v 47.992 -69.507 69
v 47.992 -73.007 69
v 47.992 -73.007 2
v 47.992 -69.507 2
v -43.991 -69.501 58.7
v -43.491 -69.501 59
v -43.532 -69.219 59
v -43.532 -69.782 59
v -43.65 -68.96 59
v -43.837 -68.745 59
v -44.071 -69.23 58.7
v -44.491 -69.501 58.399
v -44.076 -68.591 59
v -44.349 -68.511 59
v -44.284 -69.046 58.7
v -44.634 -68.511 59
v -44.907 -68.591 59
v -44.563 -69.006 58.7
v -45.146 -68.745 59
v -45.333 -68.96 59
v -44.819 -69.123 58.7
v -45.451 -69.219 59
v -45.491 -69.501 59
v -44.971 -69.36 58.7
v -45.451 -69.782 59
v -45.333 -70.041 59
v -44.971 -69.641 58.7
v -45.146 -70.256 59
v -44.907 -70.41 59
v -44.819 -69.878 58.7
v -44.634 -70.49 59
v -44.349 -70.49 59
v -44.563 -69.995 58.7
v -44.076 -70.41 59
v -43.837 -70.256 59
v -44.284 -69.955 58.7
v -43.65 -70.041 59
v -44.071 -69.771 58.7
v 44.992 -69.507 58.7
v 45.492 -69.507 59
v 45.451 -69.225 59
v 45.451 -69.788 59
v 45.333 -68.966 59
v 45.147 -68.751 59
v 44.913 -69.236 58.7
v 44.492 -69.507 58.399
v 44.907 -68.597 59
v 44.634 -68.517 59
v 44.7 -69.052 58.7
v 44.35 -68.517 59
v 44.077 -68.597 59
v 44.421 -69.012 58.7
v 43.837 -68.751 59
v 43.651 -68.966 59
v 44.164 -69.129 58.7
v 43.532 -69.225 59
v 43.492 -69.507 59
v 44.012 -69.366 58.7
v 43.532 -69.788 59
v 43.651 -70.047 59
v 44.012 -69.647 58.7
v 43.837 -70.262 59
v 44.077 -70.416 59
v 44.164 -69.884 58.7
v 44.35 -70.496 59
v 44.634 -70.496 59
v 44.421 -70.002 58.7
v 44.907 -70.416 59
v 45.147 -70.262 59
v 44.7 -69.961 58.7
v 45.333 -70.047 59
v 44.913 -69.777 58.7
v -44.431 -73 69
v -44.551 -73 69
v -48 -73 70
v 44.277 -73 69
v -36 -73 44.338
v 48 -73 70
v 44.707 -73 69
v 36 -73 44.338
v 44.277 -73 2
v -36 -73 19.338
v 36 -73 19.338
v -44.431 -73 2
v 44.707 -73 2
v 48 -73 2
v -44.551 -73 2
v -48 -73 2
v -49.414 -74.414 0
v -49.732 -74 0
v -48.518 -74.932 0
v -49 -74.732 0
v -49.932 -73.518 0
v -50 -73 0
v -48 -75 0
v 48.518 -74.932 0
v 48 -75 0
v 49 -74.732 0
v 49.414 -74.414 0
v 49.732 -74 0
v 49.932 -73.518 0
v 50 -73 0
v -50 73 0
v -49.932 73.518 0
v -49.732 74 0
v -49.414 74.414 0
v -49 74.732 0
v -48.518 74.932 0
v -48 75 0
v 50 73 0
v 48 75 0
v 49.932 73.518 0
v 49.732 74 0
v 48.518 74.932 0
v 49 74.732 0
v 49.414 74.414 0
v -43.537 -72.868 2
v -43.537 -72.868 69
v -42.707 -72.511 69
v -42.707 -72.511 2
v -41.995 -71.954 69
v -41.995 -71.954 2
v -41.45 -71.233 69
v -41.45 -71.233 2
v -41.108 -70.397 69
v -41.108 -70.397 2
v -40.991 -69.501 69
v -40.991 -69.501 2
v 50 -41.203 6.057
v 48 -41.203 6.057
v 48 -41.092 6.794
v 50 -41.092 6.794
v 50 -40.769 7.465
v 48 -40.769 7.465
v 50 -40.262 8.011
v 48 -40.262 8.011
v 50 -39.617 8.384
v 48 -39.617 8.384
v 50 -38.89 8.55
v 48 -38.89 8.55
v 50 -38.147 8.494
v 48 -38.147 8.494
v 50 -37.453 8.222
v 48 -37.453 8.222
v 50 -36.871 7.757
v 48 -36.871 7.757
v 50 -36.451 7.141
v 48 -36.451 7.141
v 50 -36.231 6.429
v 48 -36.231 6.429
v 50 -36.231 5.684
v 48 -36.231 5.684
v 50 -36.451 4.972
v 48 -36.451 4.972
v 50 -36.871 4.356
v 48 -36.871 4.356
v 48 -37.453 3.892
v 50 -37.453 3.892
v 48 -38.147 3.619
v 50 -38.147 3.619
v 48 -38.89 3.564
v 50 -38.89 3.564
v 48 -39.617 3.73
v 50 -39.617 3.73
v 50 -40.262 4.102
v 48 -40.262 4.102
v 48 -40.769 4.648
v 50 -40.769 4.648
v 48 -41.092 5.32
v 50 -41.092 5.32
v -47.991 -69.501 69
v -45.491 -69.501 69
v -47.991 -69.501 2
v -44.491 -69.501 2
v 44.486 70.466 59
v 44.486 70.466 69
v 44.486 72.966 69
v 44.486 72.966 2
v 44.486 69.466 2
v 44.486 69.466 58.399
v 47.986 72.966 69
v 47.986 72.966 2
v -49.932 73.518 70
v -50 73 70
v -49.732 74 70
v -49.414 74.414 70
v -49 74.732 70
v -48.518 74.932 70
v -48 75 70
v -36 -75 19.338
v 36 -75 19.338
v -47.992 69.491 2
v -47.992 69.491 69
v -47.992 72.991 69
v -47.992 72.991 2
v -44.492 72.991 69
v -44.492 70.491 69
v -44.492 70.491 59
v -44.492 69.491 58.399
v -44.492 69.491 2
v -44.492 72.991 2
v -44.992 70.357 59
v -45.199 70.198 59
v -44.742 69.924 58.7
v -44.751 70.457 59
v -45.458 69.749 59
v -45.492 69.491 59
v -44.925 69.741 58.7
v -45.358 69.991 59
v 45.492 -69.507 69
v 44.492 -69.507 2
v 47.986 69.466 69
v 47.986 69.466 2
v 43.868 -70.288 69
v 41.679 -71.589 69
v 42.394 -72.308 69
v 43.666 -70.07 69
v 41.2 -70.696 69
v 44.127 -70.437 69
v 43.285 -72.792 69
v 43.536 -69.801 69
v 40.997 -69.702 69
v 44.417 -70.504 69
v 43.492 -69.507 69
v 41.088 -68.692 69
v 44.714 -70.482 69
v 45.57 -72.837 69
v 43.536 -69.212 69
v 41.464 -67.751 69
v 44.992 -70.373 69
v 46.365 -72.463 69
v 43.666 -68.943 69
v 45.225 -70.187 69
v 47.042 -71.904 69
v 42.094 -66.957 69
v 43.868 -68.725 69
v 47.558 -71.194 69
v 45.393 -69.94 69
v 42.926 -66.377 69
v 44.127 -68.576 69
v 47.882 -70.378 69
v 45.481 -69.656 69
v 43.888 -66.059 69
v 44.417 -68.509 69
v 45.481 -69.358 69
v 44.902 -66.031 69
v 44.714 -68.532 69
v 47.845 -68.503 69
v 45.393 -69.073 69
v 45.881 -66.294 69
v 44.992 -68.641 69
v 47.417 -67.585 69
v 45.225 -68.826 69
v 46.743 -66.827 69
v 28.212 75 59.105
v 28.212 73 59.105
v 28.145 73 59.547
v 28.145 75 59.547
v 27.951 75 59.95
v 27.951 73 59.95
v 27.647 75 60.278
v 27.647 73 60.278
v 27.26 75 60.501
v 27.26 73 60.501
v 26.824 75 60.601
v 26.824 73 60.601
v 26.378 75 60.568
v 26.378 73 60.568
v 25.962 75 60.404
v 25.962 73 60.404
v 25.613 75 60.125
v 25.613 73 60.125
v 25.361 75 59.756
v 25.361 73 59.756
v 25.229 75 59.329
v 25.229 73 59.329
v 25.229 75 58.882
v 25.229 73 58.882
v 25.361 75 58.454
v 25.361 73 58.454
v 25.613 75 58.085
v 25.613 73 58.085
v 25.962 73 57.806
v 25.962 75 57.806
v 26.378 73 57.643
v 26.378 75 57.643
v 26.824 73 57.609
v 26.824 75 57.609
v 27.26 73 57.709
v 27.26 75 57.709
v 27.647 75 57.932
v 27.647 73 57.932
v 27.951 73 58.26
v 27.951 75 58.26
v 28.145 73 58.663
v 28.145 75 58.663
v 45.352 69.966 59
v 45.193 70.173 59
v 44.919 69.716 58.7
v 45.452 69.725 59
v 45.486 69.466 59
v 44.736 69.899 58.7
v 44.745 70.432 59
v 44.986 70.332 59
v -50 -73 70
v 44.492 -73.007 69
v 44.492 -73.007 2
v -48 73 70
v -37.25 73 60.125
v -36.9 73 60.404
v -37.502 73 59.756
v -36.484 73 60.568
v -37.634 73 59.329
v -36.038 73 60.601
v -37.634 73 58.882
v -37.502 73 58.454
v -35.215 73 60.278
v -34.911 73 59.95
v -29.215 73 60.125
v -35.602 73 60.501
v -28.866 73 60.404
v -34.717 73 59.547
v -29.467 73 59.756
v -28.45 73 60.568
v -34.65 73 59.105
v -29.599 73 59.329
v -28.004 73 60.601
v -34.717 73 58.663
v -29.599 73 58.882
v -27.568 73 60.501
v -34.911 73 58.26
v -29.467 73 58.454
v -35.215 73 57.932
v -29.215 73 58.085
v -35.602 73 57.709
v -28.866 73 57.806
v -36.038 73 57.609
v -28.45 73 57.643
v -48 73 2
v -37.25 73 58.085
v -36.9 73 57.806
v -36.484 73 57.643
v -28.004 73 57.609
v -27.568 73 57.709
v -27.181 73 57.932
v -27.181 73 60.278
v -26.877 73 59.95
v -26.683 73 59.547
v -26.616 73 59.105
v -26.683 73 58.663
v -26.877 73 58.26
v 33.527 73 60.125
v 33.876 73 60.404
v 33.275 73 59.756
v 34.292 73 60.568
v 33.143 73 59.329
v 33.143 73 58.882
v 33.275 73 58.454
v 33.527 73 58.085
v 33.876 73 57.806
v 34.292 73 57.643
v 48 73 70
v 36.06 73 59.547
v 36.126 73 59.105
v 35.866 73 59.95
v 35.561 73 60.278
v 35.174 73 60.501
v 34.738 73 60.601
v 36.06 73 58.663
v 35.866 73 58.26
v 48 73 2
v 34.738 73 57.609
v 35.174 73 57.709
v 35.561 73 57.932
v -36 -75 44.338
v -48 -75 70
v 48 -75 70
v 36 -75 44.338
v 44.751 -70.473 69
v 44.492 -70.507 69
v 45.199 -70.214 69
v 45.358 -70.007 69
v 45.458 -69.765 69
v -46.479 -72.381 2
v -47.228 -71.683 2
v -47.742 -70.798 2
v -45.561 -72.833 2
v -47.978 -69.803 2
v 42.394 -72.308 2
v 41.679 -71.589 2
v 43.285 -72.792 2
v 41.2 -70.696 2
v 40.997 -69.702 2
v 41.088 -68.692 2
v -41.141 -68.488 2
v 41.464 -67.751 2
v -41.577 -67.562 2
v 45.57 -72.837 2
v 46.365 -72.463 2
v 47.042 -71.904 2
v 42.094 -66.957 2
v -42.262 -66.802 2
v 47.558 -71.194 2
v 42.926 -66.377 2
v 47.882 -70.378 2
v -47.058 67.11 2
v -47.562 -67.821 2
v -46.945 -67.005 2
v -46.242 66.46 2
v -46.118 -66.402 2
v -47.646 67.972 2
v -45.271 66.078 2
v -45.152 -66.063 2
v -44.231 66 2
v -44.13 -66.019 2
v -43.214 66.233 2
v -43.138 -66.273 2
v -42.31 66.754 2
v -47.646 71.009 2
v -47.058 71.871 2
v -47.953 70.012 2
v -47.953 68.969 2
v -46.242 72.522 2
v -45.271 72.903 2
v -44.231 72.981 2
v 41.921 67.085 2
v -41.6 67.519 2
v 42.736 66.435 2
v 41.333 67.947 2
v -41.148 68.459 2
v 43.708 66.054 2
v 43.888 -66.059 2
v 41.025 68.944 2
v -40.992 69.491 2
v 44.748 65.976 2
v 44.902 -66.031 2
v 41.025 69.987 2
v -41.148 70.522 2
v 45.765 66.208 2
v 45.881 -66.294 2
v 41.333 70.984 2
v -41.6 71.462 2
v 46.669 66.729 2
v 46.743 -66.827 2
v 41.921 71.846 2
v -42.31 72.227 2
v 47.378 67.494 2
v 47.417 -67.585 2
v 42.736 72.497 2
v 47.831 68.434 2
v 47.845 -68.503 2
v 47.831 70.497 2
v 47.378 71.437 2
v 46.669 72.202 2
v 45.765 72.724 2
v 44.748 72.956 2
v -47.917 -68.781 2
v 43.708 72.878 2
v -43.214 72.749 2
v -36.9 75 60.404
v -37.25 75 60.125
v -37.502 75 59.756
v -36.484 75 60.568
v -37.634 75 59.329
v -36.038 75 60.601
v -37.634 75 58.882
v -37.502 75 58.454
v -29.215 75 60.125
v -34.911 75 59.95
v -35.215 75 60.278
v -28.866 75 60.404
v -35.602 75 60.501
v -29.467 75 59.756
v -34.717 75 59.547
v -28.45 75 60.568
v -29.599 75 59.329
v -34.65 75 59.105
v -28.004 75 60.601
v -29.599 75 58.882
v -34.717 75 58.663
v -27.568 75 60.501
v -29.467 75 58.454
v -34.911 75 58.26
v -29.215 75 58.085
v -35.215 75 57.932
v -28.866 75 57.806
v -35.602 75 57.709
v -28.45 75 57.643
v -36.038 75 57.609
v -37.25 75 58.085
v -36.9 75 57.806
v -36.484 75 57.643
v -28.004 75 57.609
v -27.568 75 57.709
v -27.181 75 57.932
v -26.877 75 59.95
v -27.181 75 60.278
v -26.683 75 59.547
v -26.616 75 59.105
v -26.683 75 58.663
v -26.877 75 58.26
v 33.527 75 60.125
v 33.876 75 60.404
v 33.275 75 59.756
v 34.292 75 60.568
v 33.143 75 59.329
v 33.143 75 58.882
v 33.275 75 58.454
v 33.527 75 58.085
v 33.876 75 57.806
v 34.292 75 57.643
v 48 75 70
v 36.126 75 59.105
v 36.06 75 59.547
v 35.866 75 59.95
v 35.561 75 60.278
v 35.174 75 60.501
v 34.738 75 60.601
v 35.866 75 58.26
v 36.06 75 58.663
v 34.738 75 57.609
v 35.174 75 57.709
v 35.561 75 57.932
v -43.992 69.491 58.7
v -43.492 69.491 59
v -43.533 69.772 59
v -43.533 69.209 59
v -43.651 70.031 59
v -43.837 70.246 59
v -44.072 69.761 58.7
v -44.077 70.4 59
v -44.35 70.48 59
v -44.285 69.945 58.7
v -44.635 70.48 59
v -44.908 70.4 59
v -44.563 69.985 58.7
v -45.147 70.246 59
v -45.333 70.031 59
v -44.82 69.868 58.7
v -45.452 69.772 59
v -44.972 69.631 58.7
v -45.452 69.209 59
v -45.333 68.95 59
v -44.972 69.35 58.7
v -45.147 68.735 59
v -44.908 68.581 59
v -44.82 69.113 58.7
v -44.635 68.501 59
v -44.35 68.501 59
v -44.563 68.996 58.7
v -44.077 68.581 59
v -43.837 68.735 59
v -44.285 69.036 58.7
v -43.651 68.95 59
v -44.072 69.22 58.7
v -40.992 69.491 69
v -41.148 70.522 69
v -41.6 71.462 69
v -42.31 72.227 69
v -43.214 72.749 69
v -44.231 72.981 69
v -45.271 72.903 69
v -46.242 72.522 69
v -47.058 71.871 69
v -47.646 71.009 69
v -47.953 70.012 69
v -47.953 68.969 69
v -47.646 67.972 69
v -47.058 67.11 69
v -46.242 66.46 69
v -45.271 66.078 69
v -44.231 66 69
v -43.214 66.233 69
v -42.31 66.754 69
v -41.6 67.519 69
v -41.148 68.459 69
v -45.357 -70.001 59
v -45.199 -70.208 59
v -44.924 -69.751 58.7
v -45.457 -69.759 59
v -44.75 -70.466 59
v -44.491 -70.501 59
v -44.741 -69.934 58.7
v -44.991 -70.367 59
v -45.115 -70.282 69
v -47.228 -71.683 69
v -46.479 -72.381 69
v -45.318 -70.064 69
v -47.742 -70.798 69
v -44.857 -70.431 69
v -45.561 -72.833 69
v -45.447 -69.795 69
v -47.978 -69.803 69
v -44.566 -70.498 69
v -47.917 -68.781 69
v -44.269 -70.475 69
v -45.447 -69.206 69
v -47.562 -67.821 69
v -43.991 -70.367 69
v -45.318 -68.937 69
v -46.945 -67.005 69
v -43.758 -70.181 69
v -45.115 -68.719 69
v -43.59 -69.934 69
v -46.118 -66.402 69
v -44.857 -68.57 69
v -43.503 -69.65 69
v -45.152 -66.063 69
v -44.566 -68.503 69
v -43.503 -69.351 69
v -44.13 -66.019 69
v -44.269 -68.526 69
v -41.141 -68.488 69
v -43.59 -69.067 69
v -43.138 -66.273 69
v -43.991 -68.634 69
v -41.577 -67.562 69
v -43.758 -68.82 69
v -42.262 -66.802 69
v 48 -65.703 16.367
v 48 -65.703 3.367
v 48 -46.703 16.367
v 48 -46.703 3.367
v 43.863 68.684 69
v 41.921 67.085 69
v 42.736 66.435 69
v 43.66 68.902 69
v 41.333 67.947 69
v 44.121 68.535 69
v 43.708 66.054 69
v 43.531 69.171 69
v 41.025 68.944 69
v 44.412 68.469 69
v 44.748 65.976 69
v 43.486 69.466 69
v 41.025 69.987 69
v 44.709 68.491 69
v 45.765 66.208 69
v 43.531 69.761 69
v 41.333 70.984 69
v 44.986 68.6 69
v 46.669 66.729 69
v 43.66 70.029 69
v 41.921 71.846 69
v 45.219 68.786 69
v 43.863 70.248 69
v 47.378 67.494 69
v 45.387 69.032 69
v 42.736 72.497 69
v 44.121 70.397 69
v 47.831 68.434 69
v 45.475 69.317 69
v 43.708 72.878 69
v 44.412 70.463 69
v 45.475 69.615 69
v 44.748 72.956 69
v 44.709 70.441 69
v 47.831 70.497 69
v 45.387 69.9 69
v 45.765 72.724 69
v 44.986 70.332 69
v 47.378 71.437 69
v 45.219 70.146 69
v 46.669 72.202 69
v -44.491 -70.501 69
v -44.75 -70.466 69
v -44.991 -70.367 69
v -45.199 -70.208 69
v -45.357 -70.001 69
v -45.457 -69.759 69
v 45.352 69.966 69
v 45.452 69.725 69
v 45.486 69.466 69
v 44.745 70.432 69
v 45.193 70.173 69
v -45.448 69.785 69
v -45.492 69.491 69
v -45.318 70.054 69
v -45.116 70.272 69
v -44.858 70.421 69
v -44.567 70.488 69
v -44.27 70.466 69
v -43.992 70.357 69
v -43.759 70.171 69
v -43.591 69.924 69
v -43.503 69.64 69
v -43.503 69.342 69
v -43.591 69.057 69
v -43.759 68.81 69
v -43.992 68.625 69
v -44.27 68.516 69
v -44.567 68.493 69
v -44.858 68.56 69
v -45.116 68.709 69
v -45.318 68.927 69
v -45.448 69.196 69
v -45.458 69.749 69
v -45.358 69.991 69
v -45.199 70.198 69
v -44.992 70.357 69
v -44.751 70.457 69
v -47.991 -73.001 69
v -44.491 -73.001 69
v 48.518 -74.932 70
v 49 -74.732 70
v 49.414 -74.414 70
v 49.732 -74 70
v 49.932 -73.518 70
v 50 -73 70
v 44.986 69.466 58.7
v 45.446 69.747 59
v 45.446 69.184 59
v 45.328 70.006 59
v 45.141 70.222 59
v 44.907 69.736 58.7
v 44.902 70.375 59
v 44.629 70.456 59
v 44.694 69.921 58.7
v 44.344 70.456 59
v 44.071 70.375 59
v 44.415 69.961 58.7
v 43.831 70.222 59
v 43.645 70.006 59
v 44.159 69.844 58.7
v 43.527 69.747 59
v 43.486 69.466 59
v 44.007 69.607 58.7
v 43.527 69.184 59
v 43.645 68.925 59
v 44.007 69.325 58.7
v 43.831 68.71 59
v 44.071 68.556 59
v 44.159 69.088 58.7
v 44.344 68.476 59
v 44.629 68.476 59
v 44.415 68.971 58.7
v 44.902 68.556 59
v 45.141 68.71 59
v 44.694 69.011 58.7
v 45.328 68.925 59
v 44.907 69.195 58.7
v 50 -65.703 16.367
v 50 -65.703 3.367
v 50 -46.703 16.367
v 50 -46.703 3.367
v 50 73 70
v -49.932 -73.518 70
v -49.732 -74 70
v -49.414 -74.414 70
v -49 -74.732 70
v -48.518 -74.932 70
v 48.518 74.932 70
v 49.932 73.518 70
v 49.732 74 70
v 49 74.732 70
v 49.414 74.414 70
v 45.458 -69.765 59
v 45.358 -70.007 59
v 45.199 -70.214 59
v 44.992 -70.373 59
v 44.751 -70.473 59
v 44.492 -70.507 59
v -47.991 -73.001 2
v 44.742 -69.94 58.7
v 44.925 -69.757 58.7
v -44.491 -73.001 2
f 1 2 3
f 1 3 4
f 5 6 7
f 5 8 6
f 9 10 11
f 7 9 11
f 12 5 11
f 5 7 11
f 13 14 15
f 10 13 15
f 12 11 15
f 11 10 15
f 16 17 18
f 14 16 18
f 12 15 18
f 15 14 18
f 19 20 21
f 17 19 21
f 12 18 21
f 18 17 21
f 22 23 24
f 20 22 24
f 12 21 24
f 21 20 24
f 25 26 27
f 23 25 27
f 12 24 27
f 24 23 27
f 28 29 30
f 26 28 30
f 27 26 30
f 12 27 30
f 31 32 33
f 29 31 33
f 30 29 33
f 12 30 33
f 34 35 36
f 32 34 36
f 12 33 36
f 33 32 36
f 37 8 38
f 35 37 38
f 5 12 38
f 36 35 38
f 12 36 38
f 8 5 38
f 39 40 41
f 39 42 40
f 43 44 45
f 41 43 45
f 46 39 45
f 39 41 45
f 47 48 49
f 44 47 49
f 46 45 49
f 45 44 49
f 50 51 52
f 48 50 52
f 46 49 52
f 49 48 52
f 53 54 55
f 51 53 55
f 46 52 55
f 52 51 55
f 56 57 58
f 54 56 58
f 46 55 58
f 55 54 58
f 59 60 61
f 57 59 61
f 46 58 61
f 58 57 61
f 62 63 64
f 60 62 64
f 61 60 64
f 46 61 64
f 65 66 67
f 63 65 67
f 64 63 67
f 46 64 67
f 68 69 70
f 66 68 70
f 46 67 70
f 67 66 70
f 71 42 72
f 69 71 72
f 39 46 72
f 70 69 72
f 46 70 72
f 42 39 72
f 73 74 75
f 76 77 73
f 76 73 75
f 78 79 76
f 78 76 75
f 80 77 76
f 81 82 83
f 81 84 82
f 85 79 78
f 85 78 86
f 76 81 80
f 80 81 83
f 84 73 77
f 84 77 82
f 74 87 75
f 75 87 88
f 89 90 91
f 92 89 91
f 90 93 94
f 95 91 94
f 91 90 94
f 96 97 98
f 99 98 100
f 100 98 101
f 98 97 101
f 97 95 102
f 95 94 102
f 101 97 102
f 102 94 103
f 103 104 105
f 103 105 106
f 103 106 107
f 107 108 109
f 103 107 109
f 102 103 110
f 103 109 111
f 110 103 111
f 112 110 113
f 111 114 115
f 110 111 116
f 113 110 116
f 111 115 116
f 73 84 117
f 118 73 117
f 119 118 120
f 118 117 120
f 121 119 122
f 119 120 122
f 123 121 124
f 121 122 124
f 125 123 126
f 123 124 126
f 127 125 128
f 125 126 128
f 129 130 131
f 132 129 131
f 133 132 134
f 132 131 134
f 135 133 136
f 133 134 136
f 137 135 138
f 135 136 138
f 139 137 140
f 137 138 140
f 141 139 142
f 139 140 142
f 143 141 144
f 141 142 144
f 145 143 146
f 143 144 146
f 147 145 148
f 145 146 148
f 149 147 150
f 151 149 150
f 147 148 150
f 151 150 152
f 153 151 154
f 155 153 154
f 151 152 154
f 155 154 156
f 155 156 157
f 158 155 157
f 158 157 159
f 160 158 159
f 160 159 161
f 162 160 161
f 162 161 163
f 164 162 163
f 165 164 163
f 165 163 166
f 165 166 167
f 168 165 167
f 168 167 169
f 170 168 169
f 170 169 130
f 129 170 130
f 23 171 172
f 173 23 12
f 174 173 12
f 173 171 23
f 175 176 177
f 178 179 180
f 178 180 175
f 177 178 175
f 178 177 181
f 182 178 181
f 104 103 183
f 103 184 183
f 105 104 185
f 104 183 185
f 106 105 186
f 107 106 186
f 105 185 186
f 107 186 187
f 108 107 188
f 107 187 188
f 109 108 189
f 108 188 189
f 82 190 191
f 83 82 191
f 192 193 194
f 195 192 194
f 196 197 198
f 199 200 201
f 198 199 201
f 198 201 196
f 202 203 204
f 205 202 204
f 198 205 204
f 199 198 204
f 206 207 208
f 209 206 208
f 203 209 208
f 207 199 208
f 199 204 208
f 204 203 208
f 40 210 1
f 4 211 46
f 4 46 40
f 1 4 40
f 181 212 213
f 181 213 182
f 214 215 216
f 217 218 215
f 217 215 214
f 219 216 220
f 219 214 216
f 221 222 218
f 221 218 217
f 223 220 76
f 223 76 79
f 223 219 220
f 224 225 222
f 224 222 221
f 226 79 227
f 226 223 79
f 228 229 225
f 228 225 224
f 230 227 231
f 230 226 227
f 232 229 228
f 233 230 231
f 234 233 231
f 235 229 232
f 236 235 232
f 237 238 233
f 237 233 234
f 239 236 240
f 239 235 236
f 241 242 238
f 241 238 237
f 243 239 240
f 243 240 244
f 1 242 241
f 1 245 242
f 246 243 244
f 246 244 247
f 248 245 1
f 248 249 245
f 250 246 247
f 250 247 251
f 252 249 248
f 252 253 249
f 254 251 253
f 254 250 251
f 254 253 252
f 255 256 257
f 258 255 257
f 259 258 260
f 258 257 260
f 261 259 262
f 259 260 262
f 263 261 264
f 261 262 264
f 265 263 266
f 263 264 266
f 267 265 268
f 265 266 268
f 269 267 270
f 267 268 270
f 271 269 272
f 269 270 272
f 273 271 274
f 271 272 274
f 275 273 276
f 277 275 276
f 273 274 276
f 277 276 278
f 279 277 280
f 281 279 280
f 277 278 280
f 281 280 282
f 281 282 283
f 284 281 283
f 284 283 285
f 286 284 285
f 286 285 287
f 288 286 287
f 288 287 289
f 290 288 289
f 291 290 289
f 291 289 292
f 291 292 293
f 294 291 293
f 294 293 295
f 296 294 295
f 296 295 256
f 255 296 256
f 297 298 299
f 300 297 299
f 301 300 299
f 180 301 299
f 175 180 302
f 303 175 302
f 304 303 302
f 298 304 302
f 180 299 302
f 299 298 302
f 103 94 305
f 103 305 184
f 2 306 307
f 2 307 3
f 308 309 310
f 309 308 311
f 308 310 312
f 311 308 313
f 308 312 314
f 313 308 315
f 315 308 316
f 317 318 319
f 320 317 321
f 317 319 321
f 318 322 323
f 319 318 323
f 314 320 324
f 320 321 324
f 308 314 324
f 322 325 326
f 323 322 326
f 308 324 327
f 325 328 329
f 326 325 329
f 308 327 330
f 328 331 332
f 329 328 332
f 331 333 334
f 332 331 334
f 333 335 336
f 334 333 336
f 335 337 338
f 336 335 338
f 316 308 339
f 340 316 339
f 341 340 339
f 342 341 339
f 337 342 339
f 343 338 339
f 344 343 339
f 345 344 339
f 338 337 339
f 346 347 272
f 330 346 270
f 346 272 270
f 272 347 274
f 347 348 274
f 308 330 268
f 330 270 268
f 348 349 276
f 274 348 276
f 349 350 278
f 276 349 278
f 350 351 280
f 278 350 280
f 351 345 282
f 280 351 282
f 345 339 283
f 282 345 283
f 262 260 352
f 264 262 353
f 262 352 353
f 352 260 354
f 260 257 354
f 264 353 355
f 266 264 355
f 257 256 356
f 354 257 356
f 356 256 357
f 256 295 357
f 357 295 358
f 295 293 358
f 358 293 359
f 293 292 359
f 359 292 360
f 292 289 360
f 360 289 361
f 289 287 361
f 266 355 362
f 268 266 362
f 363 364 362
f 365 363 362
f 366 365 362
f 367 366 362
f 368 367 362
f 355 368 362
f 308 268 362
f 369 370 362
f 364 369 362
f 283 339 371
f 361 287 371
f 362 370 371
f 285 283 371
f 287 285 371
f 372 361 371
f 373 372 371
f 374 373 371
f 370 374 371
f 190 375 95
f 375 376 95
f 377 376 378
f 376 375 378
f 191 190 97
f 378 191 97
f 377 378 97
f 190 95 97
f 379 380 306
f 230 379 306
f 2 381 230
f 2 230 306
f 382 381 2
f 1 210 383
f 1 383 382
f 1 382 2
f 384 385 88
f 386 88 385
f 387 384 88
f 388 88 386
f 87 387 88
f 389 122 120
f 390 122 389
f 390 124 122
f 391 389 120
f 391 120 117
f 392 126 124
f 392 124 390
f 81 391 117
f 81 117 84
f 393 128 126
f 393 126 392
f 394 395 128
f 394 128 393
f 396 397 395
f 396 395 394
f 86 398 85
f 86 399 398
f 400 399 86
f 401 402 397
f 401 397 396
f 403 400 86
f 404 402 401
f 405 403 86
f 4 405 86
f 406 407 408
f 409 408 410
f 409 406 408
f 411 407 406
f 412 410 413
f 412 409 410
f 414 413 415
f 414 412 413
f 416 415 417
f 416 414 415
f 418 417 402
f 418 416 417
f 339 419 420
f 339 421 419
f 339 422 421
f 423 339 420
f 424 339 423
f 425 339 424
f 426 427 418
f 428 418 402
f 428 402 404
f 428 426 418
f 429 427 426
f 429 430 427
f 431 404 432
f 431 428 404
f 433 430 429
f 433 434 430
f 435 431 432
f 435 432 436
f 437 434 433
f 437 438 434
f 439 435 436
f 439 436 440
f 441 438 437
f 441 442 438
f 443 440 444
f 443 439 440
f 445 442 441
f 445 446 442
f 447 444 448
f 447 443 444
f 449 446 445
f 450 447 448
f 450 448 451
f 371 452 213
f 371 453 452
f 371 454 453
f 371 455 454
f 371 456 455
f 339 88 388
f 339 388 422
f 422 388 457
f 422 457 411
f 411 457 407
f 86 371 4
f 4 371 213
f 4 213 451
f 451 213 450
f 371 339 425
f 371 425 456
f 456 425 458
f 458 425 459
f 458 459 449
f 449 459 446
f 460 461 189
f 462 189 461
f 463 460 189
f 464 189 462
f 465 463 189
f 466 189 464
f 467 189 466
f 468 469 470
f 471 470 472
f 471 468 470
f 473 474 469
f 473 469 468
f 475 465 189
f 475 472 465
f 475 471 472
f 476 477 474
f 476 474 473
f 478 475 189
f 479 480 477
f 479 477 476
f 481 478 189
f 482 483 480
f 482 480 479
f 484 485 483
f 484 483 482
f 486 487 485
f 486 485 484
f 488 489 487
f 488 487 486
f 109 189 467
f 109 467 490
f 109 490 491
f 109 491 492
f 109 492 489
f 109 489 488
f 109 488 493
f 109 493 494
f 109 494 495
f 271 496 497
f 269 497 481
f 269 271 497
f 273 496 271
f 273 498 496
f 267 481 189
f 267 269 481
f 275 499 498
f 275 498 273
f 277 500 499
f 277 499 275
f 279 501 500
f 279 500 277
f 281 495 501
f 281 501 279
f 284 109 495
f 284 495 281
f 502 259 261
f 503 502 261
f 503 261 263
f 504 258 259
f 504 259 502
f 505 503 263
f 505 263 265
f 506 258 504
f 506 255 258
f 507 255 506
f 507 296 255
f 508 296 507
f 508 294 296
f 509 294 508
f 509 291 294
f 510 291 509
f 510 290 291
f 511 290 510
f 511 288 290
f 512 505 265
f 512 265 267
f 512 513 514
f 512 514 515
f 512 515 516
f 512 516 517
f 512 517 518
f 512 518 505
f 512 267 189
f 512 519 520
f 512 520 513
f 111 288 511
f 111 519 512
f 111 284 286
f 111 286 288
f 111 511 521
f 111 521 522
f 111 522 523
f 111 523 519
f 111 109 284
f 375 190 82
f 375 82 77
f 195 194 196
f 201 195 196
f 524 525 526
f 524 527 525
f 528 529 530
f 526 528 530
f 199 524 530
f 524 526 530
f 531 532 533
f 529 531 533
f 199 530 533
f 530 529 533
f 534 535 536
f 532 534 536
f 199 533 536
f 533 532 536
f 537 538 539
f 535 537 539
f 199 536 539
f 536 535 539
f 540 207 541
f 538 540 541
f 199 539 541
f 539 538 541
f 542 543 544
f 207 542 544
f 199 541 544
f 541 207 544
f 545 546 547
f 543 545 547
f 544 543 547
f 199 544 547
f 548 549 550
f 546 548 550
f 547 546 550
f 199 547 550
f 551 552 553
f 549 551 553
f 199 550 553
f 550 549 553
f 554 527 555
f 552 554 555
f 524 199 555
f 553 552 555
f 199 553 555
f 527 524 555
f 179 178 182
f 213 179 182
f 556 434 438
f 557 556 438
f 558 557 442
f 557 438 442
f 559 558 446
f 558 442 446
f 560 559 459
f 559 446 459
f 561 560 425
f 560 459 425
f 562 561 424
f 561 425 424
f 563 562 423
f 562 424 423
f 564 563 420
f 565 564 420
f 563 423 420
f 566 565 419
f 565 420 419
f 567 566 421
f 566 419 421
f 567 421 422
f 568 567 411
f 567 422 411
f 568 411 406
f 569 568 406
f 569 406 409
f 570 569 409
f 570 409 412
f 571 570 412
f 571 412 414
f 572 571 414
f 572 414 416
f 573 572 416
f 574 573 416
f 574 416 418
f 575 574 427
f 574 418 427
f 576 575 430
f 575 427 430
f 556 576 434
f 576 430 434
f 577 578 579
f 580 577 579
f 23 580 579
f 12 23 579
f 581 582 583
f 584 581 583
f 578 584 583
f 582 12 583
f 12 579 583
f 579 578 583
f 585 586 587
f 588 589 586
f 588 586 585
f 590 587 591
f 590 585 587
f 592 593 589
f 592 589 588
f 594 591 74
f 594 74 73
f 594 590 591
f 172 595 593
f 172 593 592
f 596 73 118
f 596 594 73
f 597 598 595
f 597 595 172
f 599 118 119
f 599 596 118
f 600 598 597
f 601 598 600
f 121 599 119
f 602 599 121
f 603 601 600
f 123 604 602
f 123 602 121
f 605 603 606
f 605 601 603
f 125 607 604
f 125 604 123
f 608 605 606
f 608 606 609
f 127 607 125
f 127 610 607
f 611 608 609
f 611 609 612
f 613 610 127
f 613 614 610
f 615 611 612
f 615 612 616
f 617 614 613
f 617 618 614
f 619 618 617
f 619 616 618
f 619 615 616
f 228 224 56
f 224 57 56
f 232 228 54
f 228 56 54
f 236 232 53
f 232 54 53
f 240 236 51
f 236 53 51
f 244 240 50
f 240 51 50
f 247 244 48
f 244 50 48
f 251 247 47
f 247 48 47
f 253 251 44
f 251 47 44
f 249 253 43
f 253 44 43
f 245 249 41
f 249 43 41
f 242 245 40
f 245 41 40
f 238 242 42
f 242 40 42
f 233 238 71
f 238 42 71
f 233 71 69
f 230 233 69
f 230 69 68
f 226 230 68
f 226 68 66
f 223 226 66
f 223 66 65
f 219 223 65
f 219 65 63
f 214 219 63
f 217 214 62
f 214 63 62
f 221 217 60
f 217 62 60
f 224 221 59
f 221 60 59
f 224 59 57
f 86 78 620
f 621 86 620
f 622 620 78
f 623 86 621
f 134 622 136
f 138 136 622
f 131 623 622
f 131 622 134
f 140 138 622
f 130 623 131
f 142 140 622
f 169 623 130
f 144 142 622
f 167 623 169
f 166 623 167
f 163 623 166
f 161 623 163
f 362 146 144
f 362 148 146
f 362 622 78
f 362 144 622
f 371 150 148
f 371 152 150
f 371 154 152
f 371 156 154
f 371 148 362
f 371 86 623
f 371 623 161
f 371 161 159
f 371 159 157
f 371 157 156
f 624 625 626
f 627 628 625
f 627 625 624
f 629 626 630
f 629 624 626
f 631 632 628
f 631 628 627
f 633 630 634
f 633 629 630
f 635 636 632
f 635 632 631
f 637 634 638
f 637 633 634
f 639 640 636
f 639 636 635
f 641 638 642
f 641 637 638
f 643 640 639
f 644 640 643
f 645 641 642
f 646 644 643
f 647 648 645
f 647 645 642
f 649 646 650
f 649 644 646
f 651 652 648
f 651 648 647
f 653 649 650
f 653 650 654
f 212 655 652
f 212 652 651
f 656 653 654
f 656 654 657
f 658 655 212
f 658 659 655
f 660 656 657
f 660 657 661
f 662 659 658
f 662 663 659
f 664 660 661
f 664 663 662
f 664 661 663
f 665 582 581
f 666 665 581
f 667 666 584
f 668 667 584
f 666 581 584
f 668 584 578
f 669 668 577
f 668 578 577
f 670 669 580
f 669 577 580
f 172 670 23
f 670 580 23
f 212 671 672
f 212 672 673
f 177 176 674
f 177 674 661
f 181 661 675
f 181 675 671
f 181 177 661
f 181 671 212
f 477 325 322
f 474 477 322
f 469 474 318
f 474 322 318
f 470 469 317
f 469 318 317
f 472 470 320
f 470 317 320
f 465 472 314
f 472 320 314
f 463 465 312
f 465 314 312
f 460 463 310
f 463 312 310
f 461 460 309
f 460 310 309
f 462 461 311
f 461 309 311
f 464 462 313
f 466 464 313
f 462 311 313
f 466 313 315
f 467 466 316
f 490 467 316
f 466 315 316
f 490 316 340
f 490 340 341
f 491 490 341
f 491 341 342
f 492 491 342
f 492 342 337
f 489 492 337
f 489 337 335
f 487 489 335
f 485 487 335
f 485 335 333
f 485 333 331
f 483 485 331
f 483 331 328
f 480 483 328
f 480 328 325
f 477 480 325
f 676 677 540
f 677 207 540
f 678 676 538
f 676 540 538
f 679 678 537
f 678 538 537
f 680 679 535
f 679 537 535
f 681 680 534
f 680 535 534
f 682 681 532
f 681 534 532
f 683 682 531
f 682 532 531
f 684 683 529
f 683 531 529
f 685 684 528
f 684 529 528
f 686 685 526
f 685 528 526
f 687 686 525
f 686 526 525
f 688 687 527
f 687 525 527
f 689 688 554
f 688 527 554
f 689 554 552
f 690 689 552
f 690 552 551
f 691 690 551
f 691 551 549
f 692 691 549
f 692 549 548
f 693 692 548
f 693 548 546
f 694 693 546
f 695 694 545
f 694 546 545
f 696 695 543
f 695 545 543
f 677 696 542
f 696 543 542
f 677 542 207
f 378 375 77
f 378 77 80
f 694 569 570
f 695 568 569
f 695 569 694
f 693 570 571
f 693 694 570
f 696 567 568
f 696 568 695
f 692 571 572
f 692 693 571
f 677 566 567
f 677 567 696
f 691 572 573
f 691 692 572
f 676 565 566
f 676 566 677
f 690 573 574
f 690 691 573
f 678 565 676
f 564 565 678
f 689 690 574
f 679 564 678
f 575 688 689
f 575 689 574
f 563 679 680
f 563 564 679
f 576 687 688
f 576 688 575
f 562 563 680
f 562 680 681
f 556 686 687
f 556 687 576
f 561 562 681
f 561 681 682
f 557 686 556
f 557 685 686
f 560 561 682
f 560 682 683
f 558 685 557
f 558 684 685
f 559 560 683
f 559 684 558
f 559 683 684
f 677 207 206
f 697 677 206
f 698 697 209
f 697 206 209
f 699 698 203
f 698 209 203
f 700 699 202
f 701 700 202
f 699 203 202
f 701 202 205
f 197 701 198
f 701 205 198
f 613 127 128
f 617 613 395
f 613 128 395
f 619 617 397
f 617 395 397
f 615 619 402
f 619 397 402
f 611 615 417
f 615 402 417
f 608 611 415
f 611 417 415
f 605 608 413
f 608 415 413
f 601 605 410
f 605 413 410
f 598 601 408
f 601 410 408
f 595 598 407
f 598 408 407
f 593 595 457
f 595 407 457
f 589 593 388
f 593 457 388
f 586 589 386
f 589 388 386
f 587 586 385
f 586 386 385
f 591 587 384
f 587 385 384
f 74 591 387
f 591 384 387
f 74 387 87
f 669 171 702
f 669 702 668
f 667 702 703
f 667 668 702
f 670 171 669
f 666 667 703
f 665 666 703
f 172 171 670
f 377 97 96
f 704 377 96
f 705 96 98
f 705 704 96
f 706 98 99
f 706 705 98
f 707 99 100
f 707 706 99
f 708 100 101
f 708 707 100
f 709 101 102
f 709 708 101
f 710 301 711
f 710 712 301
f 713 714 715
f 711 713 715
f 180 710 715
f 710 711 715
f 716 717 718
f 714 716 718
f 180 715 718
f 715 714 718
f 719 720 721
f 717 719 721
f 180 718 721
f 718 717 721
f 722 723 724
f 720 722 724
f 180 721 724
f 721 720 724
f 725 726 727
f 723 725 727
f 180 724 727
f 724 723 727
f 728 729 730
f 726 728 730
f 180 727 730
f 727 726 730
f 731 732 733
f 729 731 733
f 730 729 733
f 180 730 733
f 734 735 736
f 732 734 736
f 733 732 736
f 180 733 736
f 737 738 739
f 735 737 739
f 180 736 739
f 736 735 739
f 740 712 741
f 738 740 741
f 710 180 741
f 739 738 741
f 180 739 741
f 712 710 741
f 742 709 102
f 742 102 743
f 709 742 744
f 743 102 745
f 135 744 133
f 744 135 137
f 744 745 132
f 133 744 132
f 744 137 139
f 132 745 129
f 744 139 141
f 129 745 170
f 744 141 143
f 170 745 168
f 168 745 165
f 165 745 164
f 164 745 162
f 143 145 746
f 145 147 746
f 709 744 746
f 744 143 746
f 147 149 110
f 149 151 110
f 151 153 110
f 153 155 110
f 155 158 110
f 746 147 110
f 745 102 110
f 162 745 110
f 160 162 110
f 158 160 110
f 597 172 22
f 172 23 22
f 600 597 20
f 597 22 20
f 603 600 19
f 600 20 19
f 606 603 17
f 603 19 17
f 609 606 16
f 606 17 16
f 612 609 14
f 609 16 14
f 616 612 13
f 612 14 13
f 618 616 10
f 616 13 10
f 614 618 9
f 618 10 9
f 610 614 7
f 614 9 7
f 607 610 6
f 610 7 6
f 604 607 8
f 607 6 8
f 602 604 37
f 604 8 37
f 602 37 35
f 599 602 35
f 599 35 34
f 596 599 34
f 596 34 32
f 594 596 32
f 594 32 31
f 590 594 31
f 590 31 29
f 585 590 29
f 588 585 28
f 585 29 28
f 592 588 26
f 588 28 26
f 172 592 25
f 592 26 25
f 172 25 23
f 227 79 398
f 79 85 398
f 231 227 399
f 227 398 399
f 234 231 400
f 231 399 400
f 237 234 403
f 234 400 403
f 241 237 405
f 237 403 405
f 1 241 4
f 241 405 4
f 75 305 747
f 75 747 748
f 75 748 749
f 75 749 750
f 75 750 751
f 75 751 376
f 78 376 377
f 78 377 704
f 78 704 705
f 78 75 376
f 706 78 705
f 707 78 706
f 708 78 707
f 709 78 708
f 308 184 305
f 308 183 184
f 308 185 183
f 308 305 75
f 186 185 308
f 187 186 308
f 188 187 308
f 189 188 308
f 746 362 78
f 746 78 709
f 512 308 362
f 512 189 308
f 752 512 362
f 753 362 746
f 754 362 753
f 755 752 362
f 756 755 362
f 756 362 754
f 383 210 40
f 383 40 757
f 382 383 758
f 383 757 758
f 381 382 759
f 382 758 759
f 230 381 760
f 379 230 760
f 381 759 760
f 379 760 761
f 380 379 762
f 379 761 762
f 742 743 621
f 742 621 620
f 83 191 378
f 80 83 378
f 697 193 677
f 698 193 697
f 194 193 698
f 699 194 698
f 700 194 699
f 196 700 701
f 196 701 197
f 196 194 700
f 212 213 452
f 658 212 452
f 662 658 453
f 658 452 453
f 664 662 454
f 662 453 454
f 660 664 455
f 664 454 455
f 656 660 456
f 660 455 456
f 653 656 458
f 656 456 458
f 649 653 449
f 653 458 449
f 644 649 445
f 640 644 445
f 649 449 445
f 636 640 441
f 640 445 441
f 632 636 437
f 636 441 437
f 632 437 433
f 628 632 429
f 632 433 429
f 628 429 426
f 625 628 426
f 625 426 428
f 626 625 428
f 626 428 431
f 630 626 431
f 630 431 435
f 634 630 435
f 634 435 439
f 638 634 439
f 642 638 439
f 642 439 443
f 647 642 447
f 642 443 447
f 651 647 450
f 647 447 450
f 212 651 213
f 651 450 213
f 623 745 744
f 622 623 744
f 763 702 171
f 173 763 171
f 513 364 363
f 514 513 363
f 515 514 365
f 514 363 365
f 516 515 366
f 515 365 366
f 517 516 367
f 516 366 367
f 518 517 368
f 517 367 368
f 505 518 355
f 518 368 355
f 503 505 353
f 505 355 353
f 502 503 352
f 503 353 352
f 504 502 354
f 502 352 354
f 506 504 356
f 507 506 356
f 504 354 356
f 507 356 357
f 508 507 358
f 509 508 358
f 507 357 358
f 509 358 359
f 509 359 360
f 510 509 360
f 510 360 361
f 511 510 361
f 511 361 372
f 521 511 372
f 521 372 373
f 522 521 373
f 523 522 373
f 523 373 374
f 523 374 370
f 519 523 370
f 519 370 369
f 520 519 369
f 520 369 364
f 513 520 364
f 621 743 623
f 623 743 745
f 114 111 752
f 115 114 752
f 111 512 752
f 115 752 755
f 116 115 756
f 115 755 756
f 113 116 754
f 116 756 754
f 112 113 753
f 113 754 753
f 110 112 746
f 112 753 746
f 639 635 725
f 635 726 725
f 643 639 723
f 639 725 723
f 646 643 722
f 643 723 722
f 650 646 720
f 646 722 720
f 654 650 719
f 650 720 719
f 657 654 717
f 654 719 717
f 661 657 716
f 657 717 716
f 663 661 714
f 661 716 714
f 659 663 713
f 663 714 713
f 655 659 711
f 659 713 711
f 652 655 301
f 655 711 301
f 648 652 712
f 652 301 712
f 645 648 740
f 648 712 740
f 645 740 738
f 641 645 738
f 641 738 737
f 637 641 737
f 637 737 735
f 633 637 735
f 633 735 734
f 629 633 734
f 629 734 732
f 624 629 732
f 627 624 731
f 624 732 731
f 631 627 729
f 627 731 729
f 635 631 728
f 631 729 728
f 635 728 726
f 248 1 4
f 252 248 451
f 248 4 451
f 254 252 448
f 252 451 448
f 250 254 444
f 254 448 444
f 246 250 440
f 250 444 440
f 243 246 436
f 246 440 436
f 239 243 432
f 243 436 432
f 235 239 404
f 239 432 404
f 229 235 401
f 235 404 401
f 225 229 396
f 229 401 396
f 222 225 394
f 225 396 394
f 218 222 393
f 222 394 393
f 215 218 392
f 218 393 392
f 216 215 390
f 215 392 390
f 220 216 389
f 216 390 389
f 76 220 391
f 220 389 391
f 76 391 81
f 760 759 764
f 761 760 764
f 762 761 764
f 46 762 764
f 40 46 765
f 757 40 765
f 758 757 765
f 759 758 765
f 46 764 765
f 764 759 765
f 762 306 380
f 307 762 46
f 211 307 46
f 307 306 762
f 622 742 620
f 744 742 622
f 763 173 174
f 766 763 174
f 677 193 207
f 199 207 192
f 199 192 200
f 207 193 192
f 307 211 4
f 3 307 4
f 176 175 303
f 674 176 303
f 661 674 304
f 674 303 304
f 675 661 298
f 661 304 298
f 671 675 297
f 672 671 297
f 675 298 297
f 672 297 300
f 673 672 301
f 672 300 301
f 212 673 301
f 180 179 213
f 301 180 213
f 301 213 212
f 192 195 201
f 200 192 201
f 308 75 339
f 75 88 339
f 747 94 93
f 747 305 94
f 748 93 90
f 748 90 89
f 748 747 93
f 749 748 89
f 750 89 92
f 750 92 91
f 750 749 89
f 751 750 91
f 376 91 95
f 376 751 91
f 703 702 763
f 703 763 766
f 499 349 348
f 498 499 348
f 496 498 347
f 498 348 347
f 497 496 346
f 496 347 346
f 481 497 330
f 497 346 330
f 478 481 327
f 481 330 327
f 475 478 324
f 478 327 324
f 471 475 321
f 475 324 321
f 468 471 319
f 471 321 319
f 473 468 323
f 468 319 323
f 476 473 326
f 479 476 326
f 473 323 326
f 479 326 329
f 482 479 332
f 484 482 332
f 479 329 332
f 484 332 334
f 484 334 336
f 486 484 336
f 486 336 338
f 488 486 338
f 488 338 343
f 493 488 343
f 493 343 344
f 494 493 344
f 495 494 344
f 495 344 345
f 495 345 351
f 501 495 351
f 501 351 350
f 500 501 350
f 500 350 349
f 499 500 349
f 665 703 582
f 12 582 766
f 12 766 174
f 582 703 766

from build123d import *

# Parameters (mm, degrees)
F0_W               = 100
F0_H               = 150
F1_DEPTH           = 70
F2_T               = -2
F3_W               = 72
F3_H               = 25
F4_DEPTH           = 3
F6_D               = 3
F6_DEPTH           = 4
F6_TIP             = 0.9012909285
F8_D               = 5
F8_DEPTH           = 4
F8_TIP             = 1.5021515476
F9_R               = 2
F10_R              = 3.5
F11_R              = 3.5
F13_R              = 3.5
F12_R              = 3.5
F14_DEPTH          = 67
F15_W              = 3.5
F15_H              = 3.5
F16_DEPTH          = 67
F21_D              = 2
F21_DEPTH          = 10
F21_TIP            = 0.600860619
F21_2_D            = 2
F21_2_DEPTH        = 10
F21_2_TIP          = 0.600860619
F21_ON_F18_D       = 2
F21_ON_F18_DEPTH   = 10
F21_ON_F18_TIP     = 0.600860619
F21_ON_F18_2_D     = 2
F21_ON_F18_2_DEPTH = 10
F21_ON_F18_2_TIP   = 0.600860619
F21_ON_F19_D       = 2
F21_ON_F19_DEPTH   = 10
F21_ON_F19_TIP     = 0.600860619
F21_ON_F19_2_D     = 2
F21_ON_F19_2_DEPTH = 10
F21_ON_F19_2_TIP   = 0.600860619
F21_ON_F20_D       = 2
F21_ON_F20_DEPTH   = 10
F21_ON_F20_TIP     = 0.600860619
F21_ON_F20_2_D     = 2
F21_ON_F20_2_DEPTH = 10
F21_ON_F20_2_TIP   = 0.600860619
F22_W              = 19
F22_H              = 13
F23_DEPTH          = 25.4


with BuildPart() as f1:
    # F0 (on Top) → F1 (new body)
    with BuildSketch(Plane.XY):
        Rectangle(F0_W, F0_H)
    extrude(amount=F1_DEPTH)

    # F2
    f2_openings = [f1.faces().sort_by_distance(p)[0] for p in [
        (0, 0, 70),
    ]]
    offset(amount=F2_T, openings=f2_openings)

    # F3 (on face) → F4 (cut)
    with BuildSketch(Plane.XZ.offset(75)):
        with Locations((0, 31.8381508402)):
            Rectangle(F3_W, F3_H)
    extrude(amount=-F4_DEPTH, mode=Mode.SUBTRACT)

    # F6
    with Locations(Plane(origin=(0, 75, 0), x_dir=(-1, 0, 0), z_dir=(0, 1, 0))):
        with Locations((-34.6261933446, 59.1051355004), (-26.7121009529, 59.1051355004), (28.1158592552, 59.1051355004), (36.150354892, 59.1051355004)):
            Hole(F6_D / 2, depth=F6_DEPTH)
            with Locations((0, 0, -(F6_DEPTH + F6_TIP / 2))):  # 118° drill point
                Cone(0, F6_D / 2, F6_TIP, mode=Mode.SUBTRACT)

    # F8
    with Locations(Plane.YZ.offset(50)):
        with Locations((-38.7034714222, 6.0567087494)):
            Hole(F8_D / 2, depth=F8_DEPTH)
            with Locations((0, 0, -(F8_DEPTH + F8_TIP / 2))):  # 118° drill point
                Cone(0, F8_D / 2, F8_TIP, mode=Mode.SUBTRACT)

    # F9
    f9_edges = [f1.edges().sort_by_distance(p)[0] for p in [
        (-50, -75, 35),
        (-50, 75, 35),
        (50, 75, 35),
        (50, -75, 35),
    ]]
    fillet(f9_edges, radius=F9_R)

    # F10 (on face) + F11 (on face) + F13 (on face) + F12 (on face) → F14 (join)
    with BuildSketch(Plane.XY.offset(2)):
        with Locations((-44.4922447205, 69.4905892015)):
            Circle(F10_R)
    with BuildSketch(Plane.XY.offset(2)):
        with Locations((44.4863475859, 69.4657564163)):
            Circle(F11_R)
    with BuildSketch(Plane.XY.offset(2)):
        with Locations((-44.4913990796, -69.5005133748)):
            Circle(F13_R)
    with BuildSketch(Plane.XY.offset(2)):
        with Locations((44.4919168949, -69.5066079497)):
            Circle(F12_R)
    extrude(amount=F14_DEPTH)

    # F21
    with Locations(Plane.XY.offset(69)):
        with Locations((-44.4913990796, -69.5005133748)):
            Hole(F21_D / 2, depth=F21_DEPTH)
            with Locations((0, 0, -(F21_DEPTH + F21_TIP / 2))):  # 118° drill point
                Cone(0, F21_D / 2, F21_TIP, mode=Mode.SUBTRACT)

    # F21 on F18
    with Locations(Plane.XY.offset(69)):
        with Locations((-44.4922447205, 69.4905892015)):
            Hole(F21_ON_F18_D / 2, depth=F21_ON_F18_DEPTH)
            with Locations((0, 0, -(F21_ON_F18_DEPTH + F21_ON_F18_TIP / 2))):  # 118° drill point
                Cone(0, F21_ON_F18_D / 2, F21_ON_F18_TIP, mode=Mode.SUBTRACT)

    # F21 on F19
    with Locations(Plane.XY.offset(69)):
        with Locations((44.4863475859, 69.4657564163)):
            Hole(F21_ON_F19_D / 2, depth=F21_ON_F19_DEPTH)
            with Locations((0, 0, -(F21_ON_F19_DEPTH + F21_ON_F19_TIP / 2))):  # 118° drill point
                Cone(0, F21_ON_F19_D / 2, F21_ON_F19_TIP, mode=Mode.SUBTRACT)

    # F21 on F20
    with Locations(Plane.XY.offset(69)):
        with Locations((44.4919168949, -69.5066079497)):
            Hole(F21_ON_F20_D / 2, depth=F21_ON_F20_DEPTH)
            with Locations((0, 0, -(F21_ON_F20_DEPTH + F21_ON_F20_TIP / 2))):  # 118° drill point
                Cone(0, F21_ON_F20_D / 2, F21_ON_F20_TIP, mode=Mode.SUBTRACT)

    # F22 (on face) → F23 (cut)
    with BuildSketch(Plane.YZ.offset(50)):
        with Locations((-56.2032939196, 9.8667674288)):
            Rectangle(F22_W, F22_H)
    extrude(amount=-F23_DEPTH, mode=Mode.SUBTRACT)


with BuildPart() as f16:
    # F15 (on face) → F16 (new body)
    with BuildSketch(Plane.XY.offset(2)):
        with Locations((-46.2422447205, 71.2405892015)):
            Rectangle(F15_W, F15_H)
    extrude(amount=F16_DEPTH)

    # F21 on F18#2
    with Locations(Plane.XY.offset(69)):
        with Locations((-44.4922447205, 69.4905892015)):
            Hole(F21_ON_F18_2_D / 2, depth=F21_ON_F18_2_DEPTH)
            with Locations((0, 0, -(F21_ON_F18_2_DEPTH + F21_ON_F18_2_TIP / 2))):  # 118° drill point
                Cone(0, F21_ON_F18_2_D / 2, F21_ON_F18_2_TIP, mode=Mode.SUBTRACT)


with BuildPart() as f16b:
    # F15 (on face) → F16, piece 2 (new body)
    with BuildSketch(Plane.XY.offset(2)):
        with Locations((46.2363475859, 71.2157564163)):
            Rectangle(F15_W, F15_H)
    extrude(amount=F16_DEPTH)

    # F21 on F19#2
    with Locations(Plane.XY.offset(69)):
        with Locations((44.4863475859, 69.4657564163)):
            Hole(F21_ON_F19_2_D / 2, depth=F21_ON_F19_2_DEPTH)
            with Locations((0, 0, -(F21_ON_F19_2_DEPTH + F21_ON_F19_2_TIP / 2))):  # 118° drill point
                Cone(0, F21_ON_F19_2_D / 2, F21_ON_F19_2_TIP, mode=Mode.SUBTRACT)


with BuildPart() as f16c:
    # F15 (on face) → F16, piece 3 (new body)
    with BuildSketch(Plane.XY.offset(2)):
        with Locations((46.2419168949, -71.2566079497)):
            Rectangle(F15_W, F15_H)
    extrude(amount=F16_DEPTH)

    # F21 on F20#2
    with Locations(Plane.XY.offset(69)):
        with Locations((44.4919168949, -69.5066079497)):
            Hole(F21_ON_F20_2_D / 2, depth=F21_ON_F20_2_DEPTH)
            with Locations((0, 0, -(F21_ON_F20_2_DEPTH + F21_ON_F20_2_TIP / 2))):  # 118° drill point
                Cone(0, F21_ON_F20_2_D / 2, F21_ON_F20_2_TIP, mode=Mode.SUBTRACT)


with BuildPart() as f16d:
    # F15 (on face) → F16, piece 4 (new body)
    with BuildSketch(Plane.XY.offset(2)):
        with Locations((-46.2413990796, -71.2505133748)):
            Rectangle(F15_W, F15_H)
    extrude(amount=F16_DEPTH)

    # F21#2
    with Locations(Plane.XY.offset(69)):
        with Locations((-44.4913990796, -69.5005133748)):
            Hole(F21_2_D / 2, depth=F21_2_DEPTH)
            with Locations((0, 0, -(F21_2_DEPTH + F21_2_TIP / 2))):  # 118° drill point
                Cone(0, F21_2_D / 2, F21_2_TIP, mode=Mode.SUBTRACT)


solid = Compound([f1.part, f16.part, f16b.part, f16c.part, f16d.part])
